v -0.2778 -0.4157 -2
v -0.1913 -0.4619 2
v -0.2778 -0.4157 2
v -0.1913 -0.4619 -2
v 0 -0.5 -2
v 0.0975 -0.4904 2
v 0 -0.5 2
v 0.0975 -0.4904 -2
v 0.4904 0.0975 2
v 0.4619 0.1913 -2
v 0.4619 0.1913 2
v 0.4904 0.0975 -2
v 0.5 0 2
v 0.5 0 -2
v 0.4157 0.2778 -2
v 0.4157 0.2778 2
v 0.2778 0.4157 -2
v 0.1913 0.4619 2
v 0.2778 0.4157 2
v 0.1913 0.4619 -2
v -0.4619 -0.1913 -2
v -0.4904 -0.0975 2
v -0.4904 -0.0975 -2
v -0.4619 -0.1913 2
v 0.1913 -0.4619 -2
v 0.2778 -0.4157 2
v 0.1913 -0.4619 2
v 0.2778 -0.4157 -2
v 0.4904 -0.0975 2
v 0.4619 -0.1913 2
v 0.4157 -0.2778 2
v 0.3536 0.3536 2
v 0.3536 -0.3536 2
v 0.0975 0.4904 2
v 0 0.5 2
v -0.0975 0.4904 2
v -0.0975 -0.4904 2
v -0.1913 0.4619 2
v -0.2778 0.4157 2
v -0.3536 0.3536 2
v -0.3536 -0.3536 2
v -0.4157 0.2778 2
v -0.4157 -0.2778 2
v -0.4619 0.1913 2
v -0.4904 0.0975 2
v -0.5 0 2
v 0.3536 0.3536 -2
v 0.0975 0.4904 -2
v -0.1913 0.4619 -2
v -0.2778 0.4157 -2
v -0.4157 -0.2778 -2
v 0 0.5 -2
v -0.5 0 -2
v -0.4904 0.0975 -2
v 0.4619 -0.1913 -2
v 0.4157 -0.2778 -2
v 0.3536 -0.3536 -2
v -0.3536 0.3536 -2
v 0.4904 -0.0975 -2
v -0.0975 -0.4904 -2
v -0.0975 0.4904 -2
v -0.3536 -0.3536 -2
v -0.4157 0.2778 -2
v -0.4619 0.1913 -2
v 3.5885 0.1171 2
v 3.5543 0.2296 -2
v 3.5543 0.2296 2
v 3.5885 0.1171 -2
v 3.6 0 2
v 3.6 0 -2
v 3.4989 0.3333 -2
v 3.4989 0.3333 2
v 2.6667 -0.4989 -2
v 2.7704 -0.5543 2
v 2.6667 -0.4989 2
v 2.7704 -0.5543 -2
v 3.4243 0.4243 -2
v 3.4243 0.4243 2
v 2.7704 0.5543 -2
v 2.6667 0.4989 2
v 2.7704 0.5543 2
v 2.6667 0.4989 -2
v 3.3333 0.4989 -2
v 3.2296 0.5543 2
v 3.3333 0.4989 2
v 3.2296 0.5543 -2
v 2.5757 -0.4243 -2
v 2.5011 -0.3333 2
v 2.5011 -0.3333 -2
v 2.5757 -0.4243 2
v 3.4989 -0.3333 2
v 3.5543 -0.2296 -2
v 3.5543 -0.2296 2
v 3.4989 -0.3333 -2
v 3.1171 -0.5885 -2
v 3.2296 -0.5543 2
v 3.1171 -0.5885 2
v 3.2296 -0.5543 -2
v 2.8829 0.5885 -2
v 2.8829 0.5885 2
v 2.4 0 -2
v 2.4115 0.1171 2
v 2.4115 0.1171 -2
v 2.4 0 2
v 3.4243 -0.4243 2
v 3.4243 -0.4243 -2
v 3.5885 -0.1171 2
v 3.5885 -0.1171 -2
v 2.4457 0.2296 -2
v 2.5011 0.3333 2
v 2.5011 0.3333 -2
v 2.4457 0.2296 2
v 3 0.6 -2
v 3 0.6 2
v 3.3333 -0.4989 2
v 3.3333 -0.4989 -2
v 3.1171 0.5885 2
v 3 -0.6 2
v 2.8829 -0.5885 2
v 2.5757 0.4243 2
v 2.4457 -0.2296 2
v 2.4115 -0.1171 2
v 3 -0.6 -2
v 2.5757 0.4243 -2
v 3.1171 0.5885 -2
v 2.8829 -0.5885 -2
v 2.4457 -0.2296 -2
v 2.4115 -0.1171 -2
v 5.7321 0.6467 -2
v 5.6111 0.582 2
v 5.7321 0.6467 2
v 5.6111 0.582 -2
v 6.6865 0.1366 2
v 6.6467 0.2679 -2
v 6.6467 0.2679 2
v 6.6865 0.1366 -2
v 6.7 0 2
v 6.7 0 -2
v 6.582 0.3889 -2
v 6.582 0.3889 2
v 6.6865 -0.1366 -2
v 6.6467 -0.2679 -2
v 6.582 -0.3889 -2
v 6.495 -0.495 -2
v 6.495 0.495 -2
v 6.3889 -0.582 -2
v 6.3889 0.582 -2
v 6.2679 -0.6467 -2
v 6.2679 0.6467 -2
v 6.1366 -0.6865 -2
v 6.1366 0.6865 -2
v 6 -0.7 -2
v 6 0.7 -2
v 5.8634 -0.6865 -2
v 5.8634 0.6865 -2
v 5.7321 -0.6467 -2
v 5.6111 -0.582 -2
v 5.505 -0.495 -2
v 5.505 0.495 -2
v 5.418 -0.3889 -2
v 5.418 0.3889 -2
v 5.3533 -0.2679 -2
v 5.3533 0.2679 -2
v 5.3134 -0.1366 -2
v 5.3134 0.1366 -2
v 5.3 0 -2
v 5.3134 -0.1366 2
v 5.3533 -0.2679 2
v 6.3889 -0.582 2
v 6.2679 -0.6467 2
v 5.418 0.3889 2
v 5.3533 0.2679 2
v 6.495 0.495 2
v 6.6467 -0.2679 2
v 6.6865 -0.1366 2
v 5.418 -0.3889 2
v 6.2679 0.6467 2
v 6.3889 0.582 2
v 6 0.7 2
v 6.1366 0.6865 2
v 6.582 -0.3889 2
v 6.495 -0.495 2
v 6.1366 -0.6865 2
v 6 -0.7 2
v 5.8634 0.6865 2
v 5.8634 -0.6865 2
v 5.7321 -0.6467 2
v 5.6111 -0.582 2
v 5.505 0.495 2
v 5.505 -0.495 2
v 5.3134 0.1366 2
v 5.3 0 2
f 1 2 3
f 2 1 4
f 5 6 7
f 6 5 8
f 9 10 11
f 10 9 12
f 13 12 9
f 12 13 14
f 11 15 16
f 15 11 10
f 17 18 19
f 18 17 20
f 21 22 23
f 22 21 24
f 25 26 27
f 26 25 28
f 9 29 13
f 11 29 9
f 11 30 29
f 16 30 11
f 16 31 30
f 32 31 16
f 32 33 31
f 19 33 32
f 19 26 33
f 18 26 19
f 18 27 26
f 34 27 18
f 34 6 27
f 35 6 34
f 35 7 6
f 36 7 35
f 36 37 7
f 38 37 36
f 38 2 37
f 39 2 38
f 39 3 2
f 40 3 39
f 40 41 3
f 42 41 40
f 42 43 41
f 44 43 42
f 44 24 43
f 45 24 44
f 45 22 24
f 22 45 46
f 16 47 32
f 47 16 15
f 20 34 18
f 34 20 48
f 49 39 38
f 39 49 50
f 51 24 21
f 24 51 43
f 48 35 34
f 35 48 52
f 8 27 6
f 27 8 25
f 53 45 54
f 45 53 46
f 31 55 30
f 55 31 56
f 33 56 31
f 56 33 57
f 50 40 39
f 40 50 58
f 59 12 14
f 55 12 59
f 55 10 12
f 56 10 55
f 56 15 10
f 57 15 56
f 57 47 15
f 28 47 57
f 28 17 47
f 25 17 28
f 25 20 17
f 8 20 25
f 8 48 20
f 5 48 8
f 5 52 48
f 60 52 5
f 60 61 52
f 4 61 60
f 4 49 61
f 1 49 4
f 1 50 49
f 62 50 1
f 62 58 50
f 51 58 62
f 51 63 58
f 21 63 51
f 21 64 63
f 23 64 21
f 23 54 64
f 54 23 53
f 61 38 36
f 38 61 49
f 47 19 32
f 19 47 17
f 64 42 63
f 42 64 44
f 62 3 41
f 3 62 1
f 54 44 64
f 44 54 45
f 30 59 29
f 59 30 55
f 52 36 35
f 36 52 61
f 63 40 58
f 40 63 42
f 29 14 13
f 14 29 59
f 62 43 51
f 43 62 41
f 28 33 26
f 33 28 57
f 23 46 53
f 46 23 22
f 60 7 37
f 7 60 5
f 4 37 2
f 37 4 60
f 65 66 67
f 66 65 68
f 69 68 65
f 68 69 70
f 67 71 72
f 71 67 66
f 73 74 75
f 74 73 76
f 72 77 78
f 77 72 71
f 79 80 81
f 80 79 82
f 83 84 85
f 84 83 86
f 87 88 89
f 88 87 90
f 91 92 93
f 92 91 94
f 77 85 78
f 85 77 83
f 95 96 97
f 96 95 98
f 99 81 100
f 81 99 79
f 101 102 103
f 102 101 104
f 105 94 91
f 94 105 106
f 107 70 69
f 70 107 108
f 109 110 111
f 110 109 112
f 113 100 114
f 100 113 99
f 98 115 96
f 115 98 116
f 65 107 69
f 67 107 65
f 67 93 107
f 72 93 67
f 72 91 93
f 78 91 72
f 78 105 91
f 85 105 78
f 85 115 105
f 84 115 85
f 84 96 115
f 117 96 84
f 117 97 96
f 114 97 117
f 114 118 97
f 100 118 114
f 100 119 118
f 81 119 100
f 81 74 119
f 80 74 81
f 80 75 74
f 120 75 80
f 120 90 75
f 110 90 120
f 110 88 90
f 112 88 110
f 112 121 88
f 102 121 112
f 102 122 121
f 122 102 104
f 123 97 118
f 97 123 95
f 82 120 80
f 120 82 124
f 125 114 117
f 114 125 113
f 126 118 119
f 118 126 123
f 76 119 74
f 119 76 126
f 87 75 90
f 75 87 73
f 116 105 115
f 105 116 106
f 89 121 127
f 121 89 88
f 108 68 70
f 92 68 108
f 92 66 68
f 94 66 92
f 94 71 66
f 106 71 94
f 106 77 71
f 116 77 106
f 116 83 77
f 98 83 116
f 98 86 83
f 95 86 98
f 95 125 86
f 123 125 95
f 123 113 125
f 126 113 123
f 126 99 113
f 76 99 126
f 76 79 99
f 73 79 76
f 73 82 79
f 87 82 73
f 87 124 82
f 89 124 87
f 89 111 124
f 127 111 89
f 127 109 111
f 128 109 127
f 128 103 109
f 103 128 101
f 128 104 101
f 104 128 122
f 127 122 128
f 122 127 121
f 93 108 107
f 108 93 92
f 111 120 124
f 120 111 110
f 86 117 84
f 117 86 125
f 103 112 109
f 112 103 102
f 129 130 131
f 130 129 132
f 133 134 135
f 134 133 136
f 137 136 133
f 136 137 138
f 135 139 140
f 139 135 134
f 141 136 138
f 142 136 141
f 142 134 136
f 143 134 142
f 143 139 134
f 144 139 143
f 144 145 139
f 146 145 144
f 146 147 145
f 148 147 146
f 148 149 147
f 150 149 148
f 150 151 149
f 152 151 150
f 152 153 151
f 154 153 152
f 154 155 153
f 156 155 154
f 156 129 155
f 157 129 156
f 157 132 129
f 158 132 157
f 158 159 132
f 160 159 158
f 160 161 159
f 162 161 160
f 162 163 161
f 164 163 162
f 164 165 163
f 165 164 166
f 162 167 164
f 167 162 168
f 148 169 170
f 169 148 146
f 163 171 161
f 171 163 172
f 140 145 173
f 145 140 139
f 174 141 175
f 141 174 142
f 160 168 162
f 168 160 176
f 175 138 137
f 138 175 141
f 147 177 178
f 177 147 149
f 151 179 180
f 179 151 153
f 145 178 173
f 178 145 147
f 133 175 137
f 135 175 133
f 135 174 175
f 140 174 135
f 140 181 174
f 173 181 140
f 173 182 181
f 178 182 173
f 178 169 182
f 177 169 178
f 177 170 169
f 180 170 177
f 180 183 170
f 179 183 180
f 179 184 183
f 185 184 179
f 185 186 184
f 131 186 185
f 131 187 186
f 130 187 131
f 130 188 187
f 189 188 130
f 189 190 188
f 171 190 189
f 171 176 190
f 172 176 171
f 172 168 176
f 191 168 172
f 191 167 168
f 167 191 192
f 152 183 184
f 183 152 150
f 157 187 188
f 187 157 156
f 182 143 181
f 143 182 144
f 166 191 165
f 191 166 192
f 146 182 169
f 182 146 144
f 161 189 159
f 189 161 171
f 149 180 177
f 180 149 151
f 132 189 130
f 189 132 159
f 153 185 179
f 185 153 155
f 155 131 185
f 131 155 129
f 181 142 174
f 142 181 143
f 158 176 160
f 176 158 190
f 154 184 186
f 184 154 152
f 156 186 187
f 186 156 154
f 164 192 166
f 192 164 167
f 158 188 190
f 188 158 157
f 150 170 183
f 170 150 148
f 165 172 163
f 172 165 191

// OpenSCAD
count = 3;
enabled = true;
mode = "rack";
step = 3.0;

module peg(offset, radius = 0.6) {
    translate([offset, 0, 0])
        cylinder(h = 4, r = radius, center = true, $fn = 32);
}

module rack(step_size, item_count) {
    for (i = [0:item_count - 1]) {
        peg(i * step_size, 0.5 + (i * 0.1));
    }
}

if (enabled && mode == "rack") {
    rack(step, count);
} else {
    cube([1, 1, 1], center = true);
}
